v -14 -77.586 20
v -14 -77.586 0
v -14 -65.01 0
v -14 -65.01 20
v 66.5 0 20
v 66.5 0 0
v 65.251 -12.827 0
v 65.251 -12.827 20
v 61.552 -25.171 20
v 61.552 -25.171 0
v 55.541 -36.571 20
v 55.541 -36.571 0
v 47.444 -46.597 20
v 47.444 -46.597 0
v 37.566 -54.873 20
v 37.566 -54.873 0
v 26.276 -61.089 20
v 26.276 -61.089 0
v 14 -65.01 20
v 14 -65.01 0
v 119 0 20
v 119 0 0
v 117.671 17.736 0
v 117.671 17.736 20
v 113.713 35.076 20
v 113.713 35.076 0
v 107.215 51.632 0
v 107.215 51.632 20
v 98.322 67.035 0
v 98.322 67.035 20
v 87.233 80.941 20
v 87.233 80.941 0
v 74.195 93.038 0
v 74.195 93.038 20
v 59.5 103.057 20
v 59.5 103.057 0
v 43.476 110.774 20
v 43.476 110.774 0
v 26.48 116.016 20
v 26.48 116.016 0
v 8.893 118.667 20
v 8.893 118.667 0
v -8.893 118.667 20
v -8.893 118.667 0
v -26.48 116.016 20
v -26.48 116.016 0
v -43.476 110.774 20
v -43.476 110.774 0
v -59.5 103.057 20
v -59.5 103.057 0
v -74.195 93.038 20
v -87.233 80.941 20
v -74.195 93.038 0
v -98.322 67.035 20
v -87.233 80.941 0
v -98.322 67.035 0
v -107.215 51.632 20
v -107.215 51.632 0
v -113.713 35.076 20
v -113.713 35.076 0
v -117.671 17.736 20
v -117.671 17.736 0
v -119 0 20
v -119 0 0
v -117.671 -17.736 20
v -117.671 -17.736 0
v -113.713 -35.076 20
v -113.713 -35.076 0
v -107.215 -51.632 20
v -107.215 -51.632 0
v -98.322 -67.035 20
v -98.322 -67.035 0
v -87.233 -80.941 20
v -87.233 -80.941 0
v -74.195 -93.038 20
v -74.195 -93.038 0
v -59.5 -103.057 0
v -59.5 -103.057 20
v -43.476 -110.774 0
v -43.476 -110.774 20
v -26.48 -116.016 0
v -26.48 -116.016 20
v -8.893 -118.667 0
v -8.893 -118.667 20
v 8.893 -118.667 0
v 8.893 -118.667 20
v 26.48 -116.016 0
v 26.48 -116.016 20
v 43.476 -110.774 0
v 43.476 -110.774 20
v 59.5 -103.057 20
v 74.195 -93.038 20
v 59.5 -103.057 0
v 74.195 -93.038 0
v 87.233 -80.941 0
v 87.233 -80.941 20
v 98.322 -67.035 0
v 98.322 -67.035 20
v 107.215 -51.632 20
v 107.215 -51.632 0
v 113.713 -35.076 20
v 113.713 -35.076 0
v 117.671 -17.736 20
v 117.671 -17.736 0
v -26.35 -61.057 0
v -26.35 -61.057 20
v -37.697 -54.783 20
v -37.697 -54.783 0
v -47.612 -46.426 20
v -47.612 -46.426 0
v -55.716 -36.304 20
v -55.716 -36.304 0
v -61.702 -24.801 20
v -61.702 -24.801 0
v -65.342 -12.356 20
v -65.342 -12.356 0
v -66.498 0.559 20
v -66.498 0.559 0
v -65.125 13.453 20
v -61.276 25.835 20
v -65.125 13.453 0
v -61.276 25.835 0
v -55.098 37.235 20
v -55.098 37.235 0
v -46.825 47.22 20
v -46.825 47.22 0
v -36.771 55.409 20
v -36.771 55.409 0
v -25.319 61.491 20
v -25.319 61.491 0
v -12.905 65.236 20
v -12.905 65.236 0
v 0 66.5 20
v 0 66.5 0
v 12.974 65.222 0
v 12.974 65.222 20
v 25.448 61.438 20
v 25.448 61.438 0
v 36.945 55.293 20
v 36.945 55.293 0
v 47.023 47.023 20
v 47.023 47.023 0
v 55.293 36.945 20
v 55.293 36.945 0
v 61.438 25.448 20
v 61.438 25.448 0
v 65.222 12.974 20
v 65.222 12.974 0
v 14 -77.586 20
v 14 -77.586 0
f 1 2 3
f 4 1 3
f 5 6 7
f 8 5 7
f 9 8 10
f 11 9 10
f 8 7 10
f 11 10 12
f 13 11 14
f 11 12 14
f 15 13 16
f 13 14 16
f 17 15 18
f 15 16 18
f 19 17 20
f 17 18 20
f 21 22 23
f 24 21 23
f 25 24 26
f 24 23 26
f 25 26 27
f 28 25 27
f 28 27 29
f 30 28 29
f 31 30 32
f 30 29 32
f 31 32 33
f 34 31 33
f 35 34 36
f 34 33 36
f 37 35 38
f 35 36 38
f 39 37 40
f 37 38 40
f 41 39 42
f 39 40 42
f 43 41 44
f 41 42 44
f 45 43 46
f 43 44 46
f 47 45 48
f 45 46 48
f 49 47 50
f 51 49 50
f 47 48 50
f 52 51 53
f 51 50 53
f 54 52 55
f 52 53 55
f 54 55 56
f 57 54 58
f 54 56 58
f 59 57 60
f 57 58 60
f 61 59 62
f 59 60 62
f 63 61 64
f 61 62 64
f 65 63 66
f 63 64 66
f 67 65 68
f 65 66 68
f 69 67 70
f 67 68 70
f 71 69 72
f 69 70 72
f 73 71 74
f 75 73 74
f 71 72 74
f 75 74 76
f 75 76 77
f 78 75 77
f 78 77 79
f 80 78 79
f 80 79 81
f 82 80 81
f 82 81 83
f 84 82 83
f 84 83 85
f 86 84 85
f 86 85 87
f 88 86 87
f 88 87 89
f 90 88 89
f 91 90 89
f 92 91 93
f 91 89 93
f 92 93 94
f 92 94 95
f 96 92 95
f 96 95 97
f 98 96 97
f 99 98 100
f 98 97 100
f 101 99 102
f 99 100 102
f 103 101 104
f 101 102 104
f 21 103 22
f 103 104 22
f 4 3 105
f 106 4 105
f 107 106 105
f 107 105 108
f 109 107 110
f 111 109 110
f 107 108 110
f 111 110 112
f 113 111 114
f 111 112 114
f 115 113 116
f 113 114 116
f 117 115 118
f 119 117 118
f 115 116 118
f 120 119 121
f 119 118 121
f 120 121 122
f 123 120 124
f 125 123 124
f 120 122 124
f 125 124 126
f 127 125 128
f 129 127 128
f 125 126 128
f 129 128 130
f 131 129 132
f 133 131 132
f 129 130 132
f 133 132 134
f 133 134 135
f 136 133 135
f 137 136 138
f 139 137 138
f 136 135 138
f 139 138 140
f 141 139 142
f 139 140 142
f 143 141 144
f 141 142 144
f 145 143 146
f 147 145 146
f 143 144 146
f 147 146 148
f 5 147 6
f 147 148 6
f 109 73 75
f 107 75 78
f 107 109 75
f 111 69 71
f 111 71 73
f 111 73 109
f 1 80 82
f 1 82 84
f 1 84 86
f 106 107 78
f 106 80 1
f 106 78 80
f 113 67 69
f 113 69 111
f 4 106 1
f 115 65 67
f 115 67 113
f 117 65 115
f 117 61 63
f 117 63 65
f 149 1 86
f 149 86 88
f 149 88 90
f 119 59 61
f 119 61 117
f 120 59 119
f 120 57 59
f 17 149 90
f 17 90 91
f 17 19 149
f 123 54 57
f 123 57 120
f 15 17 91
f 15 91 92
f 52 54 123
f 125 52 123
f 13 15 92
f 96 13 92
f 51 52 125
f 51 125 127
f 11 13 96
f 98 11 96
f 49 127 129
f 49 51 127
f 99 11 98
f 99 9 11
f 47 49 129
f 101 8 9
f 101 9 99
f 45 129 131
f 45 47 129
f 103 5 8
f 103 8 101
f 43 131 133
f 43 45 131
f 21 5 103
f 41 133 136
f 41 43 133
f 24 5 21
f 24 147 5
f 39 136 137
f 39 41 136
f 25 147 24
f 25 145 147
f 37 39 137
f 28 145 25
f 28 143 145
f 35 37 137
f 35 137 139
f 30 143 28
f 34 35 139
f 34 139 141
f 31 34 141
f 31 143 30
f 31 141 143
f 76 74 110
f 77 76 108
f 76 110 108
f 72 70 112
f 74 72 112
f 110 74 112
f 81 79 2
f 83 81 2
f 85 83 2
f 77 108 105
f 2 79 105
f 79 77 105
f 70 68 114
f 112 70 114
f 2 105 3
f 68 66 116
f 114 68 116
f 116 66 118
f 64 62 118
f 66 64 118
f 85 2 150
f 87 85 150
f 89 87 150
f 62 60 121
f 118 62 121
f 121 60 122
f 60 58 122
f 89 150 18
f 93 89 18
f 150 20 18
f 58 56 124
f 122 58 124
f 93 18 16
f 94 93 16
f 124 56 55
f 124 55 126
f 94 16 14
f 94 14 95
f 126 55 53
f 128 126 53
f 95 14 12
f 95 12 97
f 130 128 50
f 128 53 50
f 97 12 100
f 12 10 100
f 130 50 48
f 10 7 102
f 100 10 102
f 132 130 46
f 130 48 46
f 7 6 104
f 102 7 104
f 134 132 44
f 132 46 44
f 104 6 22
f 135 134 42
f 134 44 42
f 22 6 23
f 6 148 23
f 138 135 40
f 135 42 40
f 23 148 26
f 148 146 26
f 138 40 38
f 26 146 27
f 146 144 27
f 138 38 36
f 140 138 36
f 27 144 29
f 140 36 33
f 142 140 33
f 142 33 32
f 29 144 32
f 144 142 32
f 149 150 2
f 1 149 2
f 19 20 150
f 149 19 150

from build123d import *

# Parameters (mm, degrees)
F0_R     = 119
F1_DEPTH = 20


with BuildPart() as f1:
    # F0 (on Top) → F1 (new body)
    with BuildSketch(Plane.XY):
        Circle(F0_R)
        with BuildLine():
            Line((-14, -77.585713), (-14, -65.009615))
            ThreePointArc((-14, -65.009615), (-66.126354, 7.039553), (0, 66.5))
            ThreePointArc((0, 66.5), (47.022601, 47.022601), (66.5, 0))
            ThreePointArc((66.5, 0), (51.736109, -41.780677), (14, -65.009615))
            Line((14, -65.009615), (14, -77.585713))
            Line((14, -77.585713), (-14, -77.585713))
        make_face(mode=Mode.SUBTRACT)
    extrude(amount=F1_DEPTH)


solid = f1.part
